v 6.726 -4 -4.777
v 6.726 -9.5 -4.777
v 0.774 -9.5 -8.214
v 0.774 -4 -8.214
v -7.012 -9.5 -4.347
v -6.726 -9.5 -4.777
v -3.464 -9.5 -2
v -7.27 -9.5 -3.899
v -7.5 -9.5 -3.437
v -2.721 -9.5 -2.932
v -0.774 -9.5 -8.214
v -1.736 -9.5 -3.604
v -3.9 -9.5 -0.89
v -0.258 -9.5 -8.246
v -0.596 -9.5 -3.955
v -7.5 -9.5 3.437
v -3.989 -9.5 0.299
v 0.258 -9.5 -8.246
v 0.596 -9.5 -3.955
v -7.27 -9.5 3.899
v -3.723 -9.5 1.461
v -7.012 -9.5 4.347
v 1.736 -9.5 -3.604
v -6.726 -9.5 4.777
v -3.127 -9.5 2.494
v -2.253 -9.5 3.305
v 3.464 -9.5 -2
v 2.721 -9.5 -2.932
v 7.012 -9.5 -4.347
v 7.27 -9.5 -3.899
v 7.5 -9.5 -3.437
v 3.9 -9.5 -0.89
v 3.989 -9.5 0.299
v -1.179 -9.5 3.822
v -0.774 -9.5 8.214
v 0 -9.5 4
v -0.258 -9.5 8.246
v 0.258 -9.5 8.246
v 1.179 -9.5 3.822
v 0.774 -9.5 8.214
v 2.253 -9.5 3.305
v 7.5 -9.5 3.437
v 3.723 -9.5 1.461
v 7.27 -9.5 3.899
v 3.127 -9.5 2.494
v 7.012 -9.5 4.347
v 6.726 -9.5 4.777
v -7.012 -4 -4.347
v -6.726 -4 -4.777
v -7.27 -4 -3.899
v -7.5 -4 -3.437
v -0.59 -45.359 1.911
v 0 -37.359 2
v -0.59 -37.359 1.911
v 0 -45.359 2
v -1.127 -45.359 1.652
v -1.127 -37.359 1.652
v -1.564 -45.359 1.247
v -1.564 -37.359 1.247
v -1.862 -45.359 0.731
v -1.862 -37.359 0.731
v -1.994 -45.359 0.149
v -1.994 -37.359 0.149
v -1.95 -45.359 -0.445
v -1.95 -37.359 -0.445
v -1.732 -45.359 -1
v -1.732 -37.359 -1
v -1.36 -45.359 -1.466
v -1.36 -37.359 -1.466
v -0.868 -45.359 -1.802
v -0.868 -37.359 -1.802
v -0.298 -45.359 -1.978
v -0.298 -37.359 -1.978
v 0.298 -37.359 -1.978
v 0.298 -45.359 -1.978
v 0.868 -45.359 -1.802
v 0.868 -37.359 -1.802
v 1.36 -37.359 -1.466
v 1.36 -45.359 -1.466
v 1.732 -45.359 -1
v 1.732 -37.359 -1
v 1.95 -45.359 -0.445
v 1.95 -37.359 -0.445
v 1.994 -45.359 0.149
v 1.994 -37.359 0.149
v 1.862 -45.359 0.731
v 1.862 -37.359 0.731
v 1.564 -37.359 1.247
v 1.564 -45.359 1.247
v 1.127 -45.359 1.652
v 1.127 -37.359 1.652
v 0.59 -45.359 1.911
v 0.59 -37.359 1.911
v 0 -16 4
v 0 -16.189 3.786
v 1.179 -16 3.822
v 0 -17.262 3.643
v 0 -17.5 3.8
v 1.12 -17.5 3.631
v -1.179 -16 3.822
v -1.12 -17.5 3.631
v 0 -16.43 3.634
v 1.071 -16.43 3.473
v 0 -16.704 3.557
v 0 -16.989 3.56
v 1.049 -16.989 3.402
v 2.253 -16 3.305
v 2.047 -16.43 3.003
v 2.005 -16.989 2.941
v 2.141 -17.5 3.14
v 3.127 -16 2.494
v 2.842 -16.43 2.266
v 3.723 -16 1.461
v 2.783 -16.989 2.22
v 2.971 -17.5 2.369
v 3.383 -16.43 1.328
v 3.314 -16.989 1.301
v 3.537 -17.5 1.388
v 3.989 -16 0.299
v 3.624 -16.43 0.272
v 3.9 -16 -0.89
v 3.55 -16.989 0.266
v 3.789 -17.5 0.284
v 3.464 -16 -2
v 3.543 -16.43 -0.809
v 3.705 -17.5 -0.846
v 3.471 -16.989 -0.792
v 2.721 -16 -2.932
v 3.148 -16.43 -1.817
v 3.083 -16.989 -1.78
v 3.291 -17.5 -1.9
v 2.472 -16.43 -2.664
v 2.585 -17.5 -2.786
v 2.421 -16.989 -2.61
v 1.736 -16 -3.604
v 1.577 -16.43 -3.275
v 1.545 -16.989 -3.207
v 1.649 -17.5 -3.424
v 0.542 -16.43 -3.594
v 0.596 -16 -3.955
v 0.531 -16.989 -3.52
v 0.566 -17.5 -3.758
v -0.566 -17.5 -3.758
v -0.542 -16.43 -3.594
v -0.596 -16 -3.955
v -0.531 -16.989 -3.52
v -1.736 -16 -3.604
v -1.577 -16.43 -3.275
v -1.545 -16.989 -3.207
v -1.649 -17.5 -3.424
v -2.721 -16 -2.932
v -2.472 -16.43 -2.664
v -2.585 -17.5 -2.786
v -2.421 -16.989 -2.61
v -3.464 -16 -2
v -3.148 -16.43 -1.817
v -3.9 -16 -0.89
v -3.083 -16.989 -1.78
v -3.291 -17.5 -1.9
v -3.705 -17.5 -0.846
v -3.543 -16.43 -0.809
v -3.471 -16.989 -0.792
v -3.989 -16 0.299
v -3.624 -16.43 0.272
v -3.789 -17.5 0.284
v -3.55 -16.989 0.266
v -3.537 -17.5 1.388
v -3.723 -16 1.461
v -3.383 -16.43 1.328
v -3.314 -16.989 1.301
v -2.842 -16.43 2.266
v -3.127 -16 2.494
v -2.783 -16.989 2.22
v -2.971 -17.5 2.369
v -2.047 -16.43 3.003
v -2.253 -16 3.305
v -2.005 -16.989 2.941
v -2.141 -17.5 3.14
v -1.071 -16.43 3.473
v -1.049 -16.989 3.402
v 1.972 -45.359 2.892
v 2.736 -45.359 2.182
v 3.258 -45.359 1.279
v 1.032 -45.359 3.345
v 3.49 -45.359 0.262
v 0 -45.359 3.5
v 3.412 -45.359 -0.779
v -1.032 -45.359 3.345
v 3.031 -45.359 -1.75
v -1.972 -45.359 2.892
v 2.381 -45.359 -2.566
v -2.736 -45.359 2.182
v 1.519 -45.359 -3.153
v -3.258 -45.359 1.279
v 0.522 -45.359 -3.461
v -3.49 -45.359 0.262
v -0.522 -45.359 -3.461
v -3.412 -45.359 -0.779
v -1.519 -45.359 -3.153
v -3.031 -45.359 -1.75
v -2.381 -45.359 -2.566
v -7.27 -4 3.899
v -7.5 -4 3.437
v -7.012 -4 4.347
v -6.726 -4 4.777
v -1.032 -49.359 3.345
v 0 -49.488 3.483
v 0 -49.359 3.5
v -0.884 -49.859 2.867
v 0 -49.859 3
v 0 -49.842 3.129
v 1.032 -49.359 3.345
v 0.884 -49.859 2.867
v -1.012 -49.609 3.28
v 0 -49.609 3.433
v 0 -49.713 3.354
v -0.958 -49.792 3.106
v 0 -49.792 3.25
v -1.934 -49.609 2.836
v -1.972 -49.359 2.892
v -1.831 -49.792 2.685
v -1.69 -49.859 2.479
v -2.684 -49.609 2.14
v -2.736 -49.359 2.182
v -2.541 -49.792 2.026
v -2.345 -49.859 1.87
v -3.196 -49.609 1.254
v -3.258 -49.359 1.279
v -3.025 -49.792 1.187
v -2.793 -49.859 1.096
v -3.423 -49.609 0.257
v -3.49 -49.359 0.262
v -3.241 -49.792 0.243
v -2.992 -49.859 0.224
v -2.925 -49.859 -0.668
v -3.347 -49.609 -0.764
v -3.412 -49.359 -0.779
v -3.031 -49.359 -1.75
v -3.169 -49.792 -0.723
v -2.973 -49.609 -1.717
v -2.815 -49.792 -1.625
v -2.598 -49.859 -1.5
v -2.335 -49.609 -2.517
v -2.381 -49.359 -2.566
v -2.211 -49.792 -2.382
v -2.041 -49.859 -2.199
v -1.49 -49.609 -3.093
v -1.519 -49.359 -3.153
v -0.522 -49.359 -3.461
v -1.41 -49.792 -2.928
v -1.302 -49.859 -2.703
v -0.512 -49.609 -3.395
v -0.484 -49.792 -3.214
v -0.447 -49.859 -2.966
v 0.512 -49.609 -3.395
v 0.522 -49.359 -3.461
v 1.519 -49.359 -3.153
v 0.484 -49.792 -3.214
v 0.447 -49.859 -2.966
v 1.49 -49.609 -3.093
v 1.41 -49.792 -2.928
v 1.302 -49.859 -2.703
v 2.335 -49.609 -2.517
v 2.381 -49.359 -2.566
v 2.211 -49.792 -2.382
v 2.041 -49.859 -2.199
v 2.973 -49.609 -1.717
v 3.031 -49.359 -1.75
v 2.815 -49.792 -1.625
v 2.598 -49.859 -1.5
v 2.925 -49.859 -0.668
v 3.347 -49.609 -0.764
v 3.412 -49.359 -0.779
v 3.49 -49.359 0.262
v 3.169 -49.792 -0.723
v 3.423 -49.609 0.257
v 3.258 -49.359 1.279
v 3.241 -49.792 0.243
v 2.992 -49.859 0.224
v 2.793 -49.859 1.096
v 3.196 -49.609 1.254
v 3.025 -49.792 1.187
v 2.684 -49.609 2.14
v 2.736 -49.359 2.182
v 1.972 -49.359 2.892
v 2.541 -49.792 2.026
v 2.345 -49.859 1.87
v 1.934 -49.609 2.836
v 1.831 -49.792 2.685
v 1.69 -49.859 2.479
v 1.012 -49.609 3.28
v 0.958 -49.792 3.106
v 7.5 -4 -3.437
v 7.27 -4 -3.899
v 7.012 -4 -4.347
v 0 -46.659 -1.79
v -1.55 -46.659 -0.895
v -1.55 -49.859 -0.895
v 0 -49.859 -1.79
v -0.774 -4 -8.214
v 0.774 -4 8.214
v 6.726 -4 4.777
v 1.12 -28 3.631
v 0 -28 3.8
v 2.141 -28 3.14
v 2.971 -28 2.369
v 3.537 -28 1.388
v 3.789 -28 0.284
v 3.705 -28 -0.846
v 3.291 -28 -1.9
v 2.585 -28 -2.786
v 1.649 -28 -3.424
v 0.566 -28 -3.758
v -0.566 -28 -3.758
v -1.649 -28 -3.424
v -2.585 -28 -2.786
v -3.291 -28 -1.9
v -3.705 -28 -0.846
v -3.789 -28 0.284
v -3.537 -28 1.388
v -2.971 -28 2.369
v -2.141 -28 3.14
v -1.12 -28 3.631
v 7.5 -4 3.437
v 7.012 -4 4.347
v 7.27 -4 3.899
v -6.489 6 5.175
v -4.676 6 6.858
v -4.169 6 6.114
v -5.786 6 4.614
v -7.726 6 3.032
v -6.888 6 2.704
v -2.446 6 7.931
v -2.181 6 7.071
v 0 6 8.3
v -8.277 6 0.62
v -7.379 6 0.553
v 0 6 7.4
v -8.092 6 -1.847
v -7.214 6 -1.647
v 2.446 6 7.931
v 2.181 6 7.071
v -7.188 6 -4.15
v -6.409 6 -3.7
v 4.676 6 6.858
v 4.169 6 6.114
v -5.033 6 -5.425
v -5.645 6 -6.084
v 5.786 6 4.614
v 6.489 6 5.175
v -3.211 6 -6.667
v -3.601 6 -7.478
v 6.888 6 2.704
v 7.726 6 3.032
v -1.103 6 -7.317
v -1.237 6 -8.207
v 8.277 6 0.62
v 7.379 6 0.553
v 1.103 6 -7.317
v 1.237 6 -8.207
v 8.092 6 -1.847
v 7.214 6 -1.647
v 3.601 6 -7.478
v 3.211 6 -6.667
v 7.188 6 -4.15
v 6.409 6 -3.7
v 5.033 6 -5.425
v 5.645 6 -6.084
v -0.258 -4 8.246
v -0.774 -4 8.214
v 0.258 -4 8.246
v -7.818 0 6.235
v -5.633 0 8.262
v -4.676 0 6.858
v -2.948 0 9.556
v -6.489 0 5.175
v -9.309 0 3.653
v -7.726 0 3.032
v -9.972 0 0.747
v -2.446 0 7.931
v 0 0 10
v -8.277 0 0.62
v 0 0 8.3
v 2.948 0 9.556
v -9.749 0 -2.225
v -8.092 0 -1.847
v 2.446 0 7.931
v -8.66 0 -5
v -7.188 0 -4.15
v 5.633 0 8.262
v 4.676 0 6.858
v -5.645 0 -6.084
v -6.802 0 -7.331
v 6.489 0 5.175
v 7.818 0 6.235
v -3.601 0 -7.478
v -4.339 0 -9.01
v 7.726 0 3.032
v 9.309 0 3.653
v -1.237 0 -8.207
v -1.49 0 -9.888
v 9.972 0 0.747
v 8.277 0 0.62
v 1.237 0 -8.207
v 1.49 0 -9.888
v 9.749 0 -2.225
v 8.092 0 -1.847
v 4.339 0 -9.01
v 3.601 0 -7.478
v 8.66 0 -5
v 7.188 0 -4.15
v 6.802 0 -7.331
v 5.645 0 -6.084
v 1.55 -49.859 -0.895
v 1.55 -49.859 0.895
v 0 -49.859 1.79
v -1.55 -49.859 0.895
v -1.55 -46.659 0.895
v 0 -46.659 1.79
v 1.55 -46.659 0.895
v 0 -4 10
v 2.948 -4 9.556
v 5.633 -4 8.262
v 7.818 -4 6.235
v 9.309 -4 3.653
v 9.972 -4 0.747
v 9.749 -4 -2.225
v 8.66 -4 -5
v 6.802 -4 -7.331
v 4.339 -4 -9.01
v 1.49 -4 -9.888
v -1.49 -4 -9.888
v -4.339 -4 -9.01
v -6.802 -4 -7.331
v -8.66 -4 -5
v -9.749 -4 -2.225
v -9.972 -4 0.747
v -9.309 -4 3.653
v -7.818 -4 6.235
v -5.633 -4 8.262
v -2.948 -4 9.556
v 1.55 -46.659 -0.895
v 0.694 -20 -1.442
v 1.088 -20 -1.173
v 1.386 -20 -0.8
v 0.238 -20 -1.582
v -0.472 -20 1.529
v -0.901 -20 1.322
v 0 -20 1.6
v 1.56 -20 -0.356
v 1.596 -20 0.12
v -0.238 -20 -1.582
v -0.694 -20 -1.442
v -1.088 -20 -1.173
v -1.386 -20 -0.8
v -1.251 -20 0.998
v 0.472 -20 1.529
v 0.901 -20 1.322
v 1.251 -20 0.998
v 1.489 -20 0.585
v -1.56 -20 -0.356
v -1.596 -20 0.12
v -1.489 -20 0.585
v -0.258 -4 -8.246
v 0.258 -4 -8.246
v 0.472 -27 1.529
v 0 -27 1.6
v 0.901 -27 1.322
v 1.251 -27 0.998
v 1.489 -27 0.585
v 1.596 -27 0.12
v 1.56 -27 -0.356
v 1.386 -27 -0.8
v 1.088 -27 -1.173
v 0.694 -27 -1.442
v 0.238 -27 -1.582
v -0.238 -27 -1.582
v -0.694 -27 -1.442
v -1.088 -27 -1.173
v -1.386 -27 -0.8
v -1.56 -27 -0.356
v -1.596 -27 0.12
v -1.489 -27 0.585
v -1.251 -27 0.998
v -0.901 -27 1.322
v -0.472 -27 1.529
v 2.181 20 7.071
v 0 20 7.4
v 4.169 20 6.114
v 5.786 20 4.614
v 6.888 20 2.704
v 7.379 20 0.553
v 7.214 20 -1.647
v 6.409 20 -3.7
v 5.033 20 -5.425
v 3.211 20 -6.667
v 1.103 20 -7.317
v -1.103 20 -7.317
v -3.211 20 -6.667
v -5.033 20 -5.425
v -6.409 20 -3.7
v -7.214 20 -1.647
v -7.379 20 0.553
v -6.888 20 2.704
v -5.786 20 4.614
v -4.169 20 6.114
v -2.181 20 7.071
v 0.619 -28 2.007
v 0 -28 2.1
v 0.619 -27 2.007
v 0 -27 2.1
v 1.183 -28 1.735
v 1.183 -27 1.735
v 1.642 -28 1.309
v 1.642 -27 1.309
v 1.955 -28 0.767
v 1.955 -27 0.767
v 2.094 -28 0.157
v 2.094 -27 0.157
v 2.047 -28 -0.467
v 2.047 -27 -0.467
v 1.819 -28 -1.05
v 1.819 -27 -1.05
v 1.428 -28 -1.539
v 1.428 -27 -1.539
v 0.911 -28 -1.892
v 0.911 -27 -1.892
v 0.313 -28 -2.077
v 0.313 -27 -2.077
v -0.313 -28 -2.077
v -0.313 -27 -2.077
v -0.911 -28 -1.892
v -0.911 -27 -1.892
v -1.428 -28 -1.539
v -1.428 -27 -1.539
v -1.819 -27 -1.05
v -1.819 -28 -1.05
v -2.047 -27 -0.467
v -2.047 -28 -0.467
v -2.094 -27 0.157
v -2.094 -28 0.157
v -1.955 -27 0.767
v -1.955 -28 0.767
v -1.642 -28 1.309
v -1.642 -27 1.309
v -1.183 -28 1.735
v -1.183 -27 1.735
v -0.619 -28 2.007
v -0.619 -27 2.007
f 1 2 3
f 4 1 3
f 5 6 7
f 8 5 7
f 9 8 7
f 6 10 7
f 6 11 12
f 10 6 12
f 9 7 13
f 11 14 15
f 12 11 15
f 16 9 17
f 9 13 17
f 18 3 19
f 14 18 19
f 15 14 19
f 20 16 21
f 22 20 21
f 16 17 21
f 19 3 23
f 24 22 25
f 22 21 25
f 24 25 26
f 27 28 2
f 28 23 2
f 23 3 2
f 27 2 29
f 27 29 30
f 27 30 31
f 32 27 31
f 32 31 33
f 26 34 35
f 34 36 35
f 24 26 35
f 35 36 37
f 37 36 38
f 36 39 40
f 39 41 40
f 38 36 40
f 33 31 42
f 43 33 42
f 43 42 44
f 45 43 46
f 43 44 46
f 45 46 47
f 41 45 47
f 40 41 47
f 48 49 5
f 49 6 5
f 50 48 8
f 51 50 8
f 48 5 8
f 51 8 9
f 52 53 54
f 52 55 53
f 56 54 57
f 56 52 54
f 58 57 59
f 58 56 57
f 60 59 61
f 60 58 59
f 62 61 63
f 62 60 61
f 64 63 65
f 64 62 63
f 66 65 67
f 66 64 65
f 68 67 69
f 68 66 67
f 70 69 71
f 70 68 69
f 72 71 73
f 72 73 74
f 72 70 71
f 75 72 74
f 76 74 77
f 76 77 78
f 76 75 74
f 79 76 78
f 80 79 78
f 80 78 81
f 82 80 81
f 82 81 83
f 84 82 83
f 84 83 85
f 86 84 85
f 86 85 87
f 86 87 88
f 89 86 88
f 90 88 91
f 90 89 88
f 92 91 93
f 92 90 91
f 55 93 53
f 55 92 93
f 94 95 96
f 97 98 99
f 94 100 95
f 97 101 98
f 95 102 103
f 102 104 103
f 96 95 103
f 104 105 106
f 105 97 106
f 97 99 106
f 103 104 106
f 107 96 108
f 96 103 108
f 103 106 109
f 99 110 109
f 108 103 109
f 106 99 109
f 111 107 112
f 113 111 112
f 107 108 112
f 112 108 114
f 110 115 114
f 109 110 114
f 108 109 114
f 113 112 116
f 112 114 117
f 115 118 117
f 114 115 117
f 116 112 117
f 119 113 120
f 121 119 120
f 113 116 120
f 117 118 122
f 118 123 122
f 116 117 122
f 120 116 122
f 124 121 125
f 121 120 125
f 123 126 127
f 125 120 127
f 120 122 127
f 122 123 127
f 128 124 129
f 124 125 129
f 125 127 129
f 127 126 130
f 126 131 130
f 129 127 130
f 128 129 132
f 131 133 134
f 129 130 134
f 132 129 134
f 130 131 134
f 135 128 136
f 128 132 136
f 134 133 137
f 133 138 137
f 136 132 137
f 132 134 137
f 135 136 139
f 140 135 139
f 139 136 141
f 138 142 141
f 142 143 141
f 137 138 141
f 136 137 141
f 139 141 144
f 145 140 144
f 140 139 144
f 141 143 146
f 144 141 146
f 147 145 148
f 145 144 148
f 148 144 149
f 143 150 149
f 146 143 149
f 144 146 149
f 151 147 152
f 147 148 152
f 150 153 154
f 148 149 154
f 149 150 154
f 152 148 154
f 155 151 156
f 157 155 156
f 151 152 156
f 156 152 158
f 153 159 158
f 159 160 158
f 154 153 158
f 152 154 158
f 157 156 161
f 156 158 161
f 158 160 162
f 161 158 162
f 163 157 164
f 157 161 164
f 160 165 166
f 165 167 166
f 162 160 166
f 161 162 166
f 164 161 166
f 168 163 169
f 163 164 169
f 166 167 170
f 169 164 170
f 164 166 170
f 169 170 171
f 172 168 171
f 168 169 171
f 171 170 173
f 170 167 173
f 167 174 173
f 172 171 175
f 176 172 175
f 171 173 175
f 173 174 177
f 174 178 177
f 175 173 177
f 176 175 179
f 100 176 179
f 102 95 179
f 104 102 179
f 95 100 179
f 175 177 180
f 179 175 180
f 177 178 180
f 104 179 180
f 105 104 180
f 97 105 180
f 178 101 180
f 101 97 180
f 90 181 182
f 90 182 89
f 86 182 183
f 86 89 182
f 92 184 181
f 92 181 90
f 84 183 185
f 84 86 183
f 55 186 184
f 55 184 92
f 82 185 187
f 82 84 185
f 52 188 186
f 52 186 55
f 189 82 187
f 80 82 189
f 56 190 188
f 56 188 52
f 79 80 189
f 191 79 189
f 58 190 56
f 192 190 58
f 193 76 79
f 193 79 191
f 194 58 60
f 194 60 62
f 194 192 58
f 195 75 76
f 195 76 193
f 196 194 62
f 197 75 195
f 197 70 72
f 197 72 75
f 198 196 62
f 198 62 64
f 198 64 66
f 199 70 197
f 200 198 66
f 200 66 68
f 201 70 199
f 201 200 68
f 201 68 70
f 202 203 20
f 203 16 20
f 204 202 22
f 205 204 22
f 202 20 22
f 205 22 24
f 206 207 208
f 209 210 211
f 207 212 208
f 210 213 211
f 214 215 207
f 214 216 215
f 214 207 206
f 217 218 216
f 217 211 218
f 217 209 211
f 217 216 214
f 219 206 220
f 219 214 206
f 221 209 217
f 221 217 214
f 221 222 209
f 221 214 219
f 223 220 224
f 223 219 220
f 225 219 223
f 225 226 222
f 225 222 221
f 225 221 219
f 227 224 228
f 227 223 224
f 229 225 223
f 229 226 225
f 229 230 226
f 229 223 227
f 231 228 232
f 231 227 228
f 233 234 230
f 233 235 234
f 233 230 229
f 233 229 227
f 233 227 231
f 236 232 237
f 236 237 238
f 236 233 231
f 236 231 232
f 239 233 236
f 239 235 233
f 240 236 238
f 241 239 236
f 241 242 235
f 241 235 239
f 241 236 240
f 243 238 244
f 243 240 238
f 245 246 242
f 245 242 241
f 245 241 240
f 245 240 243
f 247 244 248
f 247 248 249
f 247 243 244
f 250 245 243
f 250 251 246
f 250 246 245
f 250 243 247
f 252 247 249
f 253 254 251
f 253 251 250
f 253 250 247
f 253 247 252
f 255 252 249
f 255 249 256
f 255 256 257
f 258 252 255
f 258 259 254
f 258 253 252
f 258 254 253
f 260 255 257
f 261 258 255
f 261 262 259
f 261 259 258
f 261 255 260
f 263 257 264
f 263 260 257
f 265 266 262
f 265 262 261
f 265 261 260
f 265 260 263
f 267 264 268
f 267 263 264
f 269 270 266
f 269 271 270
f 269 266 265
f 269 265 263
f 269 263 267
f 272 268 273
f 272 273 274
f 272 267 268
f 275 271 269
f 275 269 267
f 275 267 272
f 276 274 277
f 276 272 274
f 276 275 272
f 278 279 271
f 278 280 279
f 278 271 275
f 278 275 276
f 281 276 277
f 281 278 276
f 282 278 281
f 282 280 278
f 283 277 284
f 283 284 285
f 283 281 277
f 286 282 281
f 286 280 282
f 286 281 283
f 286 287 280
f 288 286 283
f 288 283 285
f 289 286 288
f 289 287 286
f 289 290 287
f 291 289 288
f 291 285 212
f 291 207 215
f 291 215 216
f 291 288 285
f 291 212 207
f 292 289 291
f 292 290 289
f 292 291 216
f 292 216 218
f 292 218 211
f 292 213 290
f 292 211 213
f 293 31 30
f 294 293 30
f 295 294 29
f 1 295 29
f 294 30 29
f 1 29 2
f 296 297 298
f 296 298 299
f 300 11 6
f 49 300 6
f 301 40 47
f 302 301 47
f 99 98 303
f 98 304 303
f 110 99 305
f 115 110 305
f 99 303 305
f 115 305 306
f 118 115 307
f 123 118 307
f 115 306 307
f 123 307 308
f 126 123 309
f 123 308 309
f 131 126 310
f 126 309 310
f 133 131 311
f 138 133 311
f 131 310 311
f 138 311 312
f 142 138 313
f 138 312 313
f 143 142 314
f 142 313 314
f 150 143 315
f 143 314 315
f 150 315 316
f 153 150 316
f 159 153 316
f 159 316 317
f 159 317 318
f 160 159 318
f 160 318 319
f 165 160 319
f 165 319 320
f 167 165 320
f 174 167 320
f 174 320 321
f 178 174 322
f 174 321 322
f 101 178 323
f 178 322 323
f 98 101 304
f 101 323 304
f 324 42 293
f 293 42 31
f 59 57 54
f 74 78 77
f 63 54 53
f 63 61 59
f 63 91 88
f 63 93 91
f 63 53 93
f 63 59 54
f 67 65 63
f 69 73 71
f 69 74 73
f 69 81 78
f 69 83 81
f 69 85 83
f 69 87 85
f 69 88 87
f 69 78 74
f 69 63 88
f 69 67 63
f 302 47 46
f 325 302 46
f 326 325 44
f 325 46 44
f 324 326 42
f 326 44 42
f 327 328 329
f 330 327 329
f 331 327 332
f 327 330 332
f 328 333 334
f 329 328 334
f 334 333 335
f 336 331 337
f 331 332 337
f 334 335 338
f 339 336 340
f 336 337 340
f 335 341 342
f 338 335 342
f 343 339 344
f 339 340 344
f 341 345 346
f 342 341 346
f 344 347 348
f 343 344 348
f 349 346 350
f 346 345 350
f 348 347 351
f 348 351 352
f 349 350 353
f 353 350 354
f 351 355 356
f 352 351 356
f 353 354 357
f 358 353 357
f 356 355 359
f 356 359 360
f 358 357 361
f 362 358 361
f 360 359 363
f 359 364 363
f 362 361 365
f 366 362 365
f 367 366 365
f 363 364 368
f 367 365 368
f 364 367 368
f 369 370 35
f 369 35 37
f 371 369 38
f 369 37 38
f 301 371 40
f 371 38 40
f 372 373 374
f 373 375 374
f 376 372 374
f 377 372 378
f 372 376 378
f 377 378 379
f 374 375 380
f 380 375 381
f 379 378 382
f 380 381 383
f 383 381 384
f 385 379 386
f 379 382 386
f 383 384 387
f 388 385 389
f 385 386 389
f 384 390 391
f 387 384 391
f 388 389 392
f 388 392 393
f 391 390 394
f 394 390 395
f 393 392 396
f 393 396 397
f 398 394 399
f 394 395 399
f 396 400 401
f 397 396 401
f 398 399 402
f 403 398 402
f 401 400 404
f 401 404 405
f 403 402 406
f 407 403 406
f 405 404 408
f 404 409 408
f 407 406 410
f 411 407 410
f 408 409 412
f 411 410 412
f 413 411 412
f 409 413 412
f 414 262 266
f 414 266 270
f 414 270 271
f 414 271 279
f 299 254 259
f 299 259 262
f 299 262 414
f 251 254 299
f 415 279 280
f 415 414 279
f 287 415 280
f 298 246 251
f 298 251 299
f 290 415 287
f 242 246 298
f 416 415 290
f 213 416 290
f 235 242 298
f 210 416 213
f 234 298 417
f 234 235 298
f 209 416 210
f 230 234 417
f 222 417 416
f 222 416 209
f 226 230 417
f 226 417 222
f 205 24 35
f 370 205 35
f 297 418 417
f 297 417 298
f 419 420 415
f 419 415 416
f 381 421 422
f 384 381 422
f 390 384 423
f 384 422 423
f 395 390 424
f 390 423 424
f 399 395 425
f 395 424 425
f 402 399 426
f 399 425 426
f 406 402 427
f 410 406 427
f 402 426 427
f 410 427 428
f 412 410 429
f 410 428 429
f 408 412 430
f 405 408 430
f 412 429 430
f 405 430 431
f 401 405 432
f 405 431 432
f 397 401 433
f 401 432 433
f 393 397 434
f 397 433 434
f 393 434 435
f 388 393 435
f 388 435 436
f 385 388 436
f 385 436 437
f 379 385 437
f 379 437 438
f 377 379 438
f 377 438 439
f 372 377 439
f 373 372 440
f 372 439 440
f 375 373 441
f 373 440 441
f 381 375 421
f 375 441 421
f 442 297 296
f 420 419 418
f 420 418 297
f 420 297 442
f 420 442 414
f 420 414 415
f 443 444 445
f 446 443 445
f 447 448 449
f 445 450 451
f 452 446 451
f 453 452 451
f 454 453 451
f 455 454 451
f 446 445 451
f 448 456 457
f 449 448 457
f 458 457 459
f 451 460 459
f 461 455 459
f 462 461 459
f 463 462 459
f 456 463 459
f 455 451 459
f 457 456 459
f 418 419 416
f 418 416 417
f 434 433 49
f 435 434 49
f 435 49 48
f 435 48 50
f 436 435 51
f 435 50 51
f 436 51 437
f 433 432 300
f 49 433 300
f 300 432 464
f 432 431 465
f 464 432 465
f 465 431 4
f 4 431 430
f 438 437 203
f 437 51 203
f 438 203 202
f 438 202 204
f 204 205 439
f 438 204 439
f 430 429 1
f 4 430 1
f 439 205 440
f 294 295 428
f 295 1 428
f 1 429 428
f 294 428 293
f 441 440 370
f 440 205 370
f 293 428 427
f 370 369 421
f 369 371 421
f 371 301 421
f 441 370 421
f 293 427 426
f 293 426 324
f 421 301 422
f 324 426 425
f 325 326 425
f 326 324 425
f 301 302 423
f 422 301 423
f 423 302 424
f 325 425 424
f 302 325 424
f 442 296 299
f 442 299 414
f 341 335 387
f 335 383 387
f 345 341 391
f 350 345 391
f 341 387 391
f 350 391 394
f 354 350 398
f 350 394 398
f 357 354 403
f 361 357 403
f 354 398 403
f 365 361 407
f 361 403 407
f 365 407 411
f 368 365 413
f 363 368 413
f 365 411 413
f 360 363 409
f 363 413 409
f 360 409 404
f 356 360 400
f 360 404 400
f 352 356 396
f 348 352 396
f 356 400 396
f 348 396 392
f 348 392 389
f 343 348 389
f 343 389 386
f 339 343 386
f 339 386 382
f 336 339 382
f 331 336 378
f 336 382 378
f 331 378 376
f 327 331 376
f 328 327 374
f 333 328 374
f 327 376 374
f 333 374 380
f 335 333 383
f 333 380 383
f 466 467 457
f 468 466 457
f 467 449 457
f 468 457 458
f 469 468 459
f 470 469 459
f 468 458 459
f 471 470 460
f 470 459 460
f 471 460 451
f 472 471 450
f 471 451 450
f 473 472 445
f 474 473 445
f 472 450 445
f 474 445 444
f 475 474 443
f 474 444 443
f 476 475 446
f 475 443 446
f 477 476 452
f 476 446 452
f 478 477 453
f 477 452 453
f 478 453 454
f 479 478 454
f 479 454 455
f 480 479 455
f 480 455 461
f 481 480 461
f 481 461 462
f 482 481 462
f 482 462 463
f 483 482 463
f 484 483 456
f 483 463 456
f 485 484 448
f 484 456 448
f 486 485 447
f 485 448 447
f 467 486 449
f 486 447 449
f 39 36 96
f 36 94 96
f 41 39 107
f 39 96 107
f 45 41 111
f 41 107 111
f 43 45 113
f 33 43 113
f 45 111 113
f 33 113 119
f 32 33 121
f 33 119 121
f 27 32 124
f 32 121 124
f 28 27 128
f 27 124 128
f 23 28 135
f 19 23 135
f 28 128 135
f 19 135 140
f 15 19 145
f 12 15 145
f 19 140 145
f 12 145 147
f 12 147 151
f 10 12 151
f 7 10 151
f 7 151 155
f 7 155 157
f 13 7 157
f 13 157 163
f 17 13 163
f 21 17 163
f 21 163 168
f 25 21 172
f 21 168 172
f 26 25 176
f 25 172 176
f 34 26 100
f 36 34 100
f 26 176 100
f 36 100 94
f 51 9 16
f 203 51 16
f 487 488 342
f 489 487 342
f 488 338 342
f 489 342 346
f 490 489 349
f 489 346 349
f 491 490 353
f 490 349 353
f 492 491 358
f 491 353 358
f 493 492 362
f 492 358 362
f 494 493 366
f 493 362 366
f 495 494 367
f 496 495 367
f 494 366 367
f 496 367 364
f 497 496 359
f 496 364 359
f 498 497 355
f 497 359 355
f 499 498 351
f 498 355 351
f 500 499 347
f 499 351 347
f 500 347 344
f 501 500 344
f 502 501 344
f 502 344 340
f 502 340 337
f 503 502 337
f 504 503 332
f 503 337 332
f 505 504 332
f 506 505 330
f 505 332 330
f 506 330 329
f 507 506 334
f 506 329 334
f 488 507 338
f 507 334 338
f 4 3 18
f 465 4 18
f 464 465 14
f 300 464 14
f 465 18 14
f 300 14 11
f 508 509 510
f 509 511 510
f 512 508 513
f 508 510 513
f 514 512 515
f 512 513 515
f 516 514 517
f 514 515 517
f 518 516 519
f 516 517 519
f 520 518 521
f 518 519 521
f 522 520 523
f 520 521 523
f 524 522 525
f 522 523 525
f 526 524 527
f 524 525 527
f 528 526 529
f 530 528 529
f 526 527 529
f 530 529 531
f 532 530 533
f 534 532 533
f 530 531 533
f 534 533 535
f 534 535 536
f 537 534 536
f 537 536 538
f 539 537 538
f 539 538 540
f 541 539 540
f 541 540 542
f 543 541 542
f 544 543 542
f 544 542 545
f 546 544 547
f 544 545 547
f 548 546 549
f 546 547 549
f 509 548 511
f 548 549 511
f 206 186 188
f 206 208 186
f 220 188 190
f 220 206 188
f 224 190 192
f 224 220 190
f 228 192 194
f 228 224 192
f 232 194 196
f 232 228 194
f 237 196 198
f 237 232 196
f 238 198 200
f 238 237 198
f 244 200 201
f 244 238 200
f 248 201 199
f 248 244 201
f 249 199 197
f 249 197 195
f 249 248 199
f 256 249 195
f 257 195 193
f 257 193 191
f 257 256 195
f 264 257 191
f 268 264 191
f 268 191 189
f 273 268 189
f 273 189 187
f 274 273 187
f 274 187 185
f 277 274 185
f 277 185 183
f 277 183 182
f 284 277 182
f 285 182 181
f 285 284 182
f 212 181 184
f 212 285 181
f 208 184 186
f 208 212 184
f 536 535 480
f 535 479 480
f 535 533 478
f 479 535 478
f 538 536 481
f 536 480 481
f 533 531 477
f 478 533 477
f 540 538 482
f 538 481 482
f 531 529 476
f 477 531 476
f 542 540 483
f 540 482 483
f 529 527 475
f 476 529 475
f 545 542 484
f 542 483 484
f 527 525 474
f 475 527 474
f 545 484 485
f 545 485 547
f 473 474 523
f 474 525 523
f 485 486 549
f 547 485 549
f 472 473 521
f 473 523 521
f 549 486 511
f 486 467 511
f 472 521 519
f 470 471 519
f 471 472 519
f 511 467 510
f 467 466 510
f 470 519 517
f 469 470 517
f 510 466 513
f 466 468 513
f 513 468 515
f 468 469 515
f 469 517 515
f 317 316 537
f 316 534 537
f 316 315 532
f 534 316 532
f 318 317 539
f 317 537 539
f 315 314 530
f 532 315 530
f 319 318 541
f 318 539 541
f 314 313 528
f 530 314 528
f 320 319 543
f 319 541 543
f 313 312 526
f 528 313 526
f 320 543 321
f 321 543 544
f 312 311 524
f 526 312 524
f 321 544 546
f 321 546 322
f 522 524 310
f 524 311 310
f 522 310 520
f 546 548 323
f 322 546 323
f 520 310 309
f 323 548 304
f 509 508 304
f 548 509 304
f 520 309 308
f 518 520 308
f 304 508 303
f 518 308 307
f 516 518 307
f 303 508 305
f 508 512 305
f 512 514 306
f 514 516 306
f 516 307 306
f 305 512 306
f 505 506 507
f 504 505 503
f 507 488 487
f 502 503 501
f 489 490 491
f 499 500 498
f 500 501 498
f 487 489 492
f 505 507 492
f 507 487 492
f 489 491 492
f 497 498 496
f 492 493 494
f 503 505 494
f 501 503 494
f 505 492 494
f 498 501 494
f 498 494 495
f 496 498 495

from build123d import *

# Parameters (mm, degrees)
F2_R     = 10
F3_DEPTH = 5.5
F7_DEPTH = 3.2


with BuildPart() as f1:
    # F0 (on Right) → F1 (revolve)
    with BuildSketch(Plane.YZ):
        with BuildLine():
            Line((-20, 0), (20, 0))
            Line((20, 0), (20, 7.4))
            Line((20, 7.4), (6, 7.4))
            Line((6, 7.4), (6, 8.3))
            Line((6, 8.3), (0, 8.3))
            Line((0, 8.3), (0, 10))
            Line((0, 10), (-4, 10))
            Line((-4, 10), (-4, 8.25))
            Line((-4, 8.25), (-9.5, 8.25))
            Line((-9.5, 8.25), (-9.5, 4))
            Line((-9.5, 4), (-16, 4))
            ThreePointArc((-16, 4), (-16.70425, 3.556871), (-17.5, 3.8))
            Line((-17.5, 3.8), (-28, 3.8))
            Line((-28, 3.8), (-28, 2.1))
            Line((-28, 2.1), (-27, 2.1))
            Line((-27, 2.1), (-27, 1.6))
            Line((-27, 1.6), (-20, 1.6))
            Line((-20, 1.6), (-20, 0))
        make_face()
    revolve(axis=Axis((0, 1.715032, 0), (0, 1, 0)))

    # F2 (on face) → F3 (cut, through all)
    with BuildSketch(Plane.XZ.offset(9.5)):
        Circle(F2_R)
        Polygon((0, 8.660254), (7.5, 4.330127), (7.5, -4.330127), (0, -8.660254), (-7.5, -4.330127), (-7.5, 4.330127), align=None, mode=Mode.SUBTRACT)
    extrude(amount=-F3_DEPTH, mode=Mode.SUBTRACT)


with BuildPart() as f5:
    # F4 (on Right) → F5 (revolve)
    with BuildSketch(Plane.YZ):
        with BuildLine():
            Line((-49.859043, 0), (-37.359043, 0))
            Line((-37.359043, 0), (-37.359043, 2))
            Line((-37.359043, 2), (-45.359043, 2))
            Line((-45.359043, 2), (-45.359043, 3.5))
            Line((-45.359043, 3.5), (-49.359043, 3.5))
            ThreePointArc((-49.359043, 3.5), (-49.712596, 3.353553), (-49.859043, 3))
            Line((-49.859043, 3), (-49.859043, 0))
        make_face()
    revolve(axis=Axis((0, -45.271234, 0), (0, -1, 0)))

    # F6 (on face) → F7 (cut)
    with BuildSketch(Plane.XZ.offset(49.859043)):
        Polygon((1.55, -0.894893), (1.55, 0.894893), (0, 1.789786), (-1.55, 0.894893), (-1.55, -0.894893), (0, -1.789786), align=None)
    extrude(amount=-F7_DEPTH, mode=Mode.SUBTRACT)


solid = Compound([f1.part, f5.part])
